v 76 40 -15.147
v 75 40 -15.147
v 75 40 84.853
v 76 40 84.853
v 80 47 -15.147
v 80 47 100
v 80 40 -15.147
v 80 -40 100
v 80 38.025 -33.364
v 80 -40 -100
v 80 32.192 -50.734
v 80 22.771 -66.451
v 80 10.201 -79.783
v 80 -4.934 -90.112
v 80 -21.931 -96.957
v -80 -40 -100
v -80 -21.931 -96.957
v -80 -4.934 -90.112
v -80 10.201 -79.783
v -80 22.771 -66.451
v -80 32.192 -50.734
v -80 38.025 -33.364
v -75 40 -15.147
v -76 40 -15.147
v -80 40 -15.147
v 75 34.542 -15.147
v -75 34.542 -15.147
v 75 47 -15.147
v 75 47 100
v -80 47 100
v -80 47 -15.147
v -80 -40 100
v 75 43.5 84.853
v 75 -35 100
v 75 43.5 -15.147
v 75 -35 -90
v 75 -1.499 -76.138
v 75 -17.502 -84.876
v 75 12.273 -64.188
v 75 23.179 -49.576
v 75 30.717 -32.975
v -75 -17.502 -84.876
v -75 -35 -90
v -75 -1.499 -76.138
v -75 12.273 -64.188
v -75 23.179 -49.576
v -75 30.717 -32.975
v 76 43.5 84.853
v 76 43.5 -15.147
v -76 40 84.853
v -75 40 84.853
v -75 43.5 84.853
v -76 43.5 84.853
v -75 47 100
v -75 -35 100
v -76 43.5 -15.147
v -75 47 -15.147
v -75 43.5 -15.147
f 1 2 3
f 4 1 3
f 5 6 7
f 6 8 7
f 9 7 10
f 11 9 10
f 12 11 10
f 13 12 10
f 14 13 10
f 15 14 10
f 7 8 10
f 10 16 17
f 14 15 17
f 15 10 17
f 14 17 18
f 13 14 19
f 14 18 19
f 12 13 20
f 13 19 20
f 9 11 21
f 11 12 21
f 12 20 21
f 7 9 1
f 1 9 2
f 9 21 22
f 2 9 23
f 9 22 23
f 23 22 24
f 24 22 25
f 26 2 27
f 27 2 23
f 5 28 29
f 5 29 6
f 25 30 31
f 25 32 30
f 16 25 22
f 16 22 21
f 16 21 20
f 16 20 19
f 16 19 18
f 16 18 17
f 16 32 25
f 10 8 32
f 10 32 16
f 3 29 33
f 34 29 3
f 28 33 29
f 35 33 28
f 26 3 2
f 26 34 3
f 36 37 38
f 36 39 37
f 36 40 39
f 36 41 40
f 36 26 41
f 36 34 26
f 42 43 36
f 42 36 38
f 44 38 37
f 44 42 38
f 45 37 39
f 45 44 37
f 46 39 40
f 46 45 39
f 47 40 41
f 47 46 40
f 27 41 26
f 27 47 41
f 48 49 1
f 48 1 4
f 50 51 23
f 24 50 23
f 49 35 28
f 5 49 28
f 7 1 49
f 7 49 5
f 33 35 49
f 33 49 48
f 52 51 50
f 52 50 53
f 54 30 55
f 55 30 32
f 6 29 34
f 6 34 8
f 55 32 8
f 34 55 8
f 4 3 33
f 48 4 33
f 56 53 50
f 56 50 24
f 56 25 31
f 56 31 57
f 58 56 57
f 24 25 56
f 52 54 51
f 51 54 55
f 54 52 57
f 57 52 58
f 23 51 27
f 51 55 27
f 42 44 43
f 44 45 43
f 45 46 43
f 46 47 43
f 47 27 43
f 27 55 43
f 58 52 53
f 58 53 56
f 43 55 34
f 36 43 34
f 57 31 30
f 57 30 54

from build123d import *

# Parameters (mm, degrees)
SKETCH1_W           = 200
SKETCH1_H           = 80
BOSS_EXTRUDE1_DEPTH = 80
SKETCH2_W           = 150
SKETCH2_H           = 70
CUT_EXTRUDE2_DEPTH  = 190
FILLET5_R           = 85
CUT_EXTRUDE6_DEPTH  = 10
SKETCH9_W           = 5
SKETCH9_H           = 115.147186258
BOSS_EXTRUDE2_DEPTH = 7
SKETCH10_W          = 5
SKETCH10_H          = 115.147186258
BOSS_EXTRUDE3_DEPTH = 7
SKETCH13_W          = 100
SKETCH13_H          = 3.5
CUT_EXTRUDE9_DEPTH  = 1
SKETCH14_W          = 100
SKETCH14_H          = 3.5
CUT_EXTRUDE10_DEPTH = 1


with BuildPart() as part:
    # Sketch1 → Boss-Extrude1 (new, symmetric)
    with BuildSketch(Plane(origin=(0, 0, 0), x_dir=(0, 0, -1), z_dir=(1, 0, 0))):
        Rectangle(SKETCH1_W, SKETCH1_H)
    extrude(amount=BOSS_EXTRUDE1_DEPTH, both=True)

    # Sketch2 → Cut-Extrude2 (cut)
    with BuildSketch(Plane.XY.offset(100)):
        Rectangle(SKETCH2_W, SKETCH2_H)
    extrude(amount=-CUT_EXTRUDE2_DEPTH, mode=Mode.SUBTRACT)

    # Fillet5
    # the kernel refuses this fillet: 85 mm, written as the material it adds along each edge
    with BuildSketch(Plane(origin=(-75, 35, -90), x_dir=(0, 0, 1), z_dir=(1, 0, 0))) as fillet5_piece_1:
        with BuildLine():
            CenterArc((83.666002653, 85), FILLET5_R, 190.164248622, 79.835751378)
            Line((0, 70), (-1.673320053, 69.7))
            ThreePointArc((-1.673320053, 69.7), (-1.7, 35), (-1.7, 0))
            Line((-1.7, 0), (0, -1.7))
            Line((0, -1.7), (83.666002653, -1.7))
            Line((83.666002653, -1.7), (83.666002653, 0))
        make_face()
    extrude(amount=150)
    # the kernel refuses this fillet: 85 mm, written as the material it takes off along each edge
    with BuildSketch(Plane(origin=(-292.132034356, 40, -100), x_dir=(0, -1, 0), z_dir=(1, 0, 0))) as fillet5_2_piece_1:
        with BuildLine():
            CenterArc((85, -84.852813742), FILLET5_R, 93.372286683, 86.627713317)
            Line((0, -84.852813742), (-1.7, -84.852813742))
            Line((-1.7, -84.852813742), (-1.7, 0))
            Line((-1.7, 0), (0, 1.7))
            ThreePointArc((0, 1.7), (40, 1.7), (79.9, 1.697056275))
            Line((79.9, 1.697056275), (80, 0))
        make_face()
    extrude(amount=584.264068712, mode=Mode.SUBTRACT)

    # Sketch8 → Cut-Extrude6 (cut)
    with BuildSketch(Plane(origin=(0, 40, 0), x_dir=(1, 0, 0), z_dir=(0, 1, 0))):
        Polygon((0, 15.147186258), (-75, 15.147186258), (-75, -100), (75, -100), (75, 15.147186258), align=None)
    extrude(amount=-CUT_EXTRUDE6_DEPTH, mode=Mode.SUBTRACT)

    # Sketch9 → Boss-Extrude2 (add)
    with BuildSketch(Plane(origin=(0, 40, 0), x_dir=(1, 0, 0), z_dir=(0, 1, 0))):
        with Locations((-77.5, -42.426406871)):
            Rectangle(SKETCH9_W, SKETCH9_H)
    extrude(amount=BOSS_EXTRUDE2_DEPTH)

    # Sketch10 → Boss-Extrude3 (add)
    with BuildSketch(Plane(origin=(0, 40, 0), x_dir=(1, 0, 0), z_dir=(0, 1, 0))):
        with Locations((77.5, -42.426406871)):
            Rectangle(SKETCH10_W, SKETCH10_H)
    extrude(amount=BOSS_EXTRUDE3_DEPTH)

    # Sketch13 → Cut-Extrude9 (cut)
    with BuildSketch(Plane(origin=(-75, 0, 0), x_dir=(0, 0, -1), z_dir=(1, 0, 0))):
        with Locations((-34.852813742, 41.75)):
            Rectangle(SKETCH13_W, SKETCH13_H)
    extrude(amount=-CUT_EXTRUDE9_DEPTH, mode=Mode.SUBTRACT)

    # Sketch14 → Cut-Extrude10 (cut)
    with BuildSketch(Plane.ZY.offset(-75)):
        with Locations((34.852813742, 41.75)):
            Rectangle(SKETCH14_W, SKETCH14_H)
    extrude(amount=-CUT_EXTRUDE10_DEPTH, mode=Mode.SUBTRACT)


solid = part.part
